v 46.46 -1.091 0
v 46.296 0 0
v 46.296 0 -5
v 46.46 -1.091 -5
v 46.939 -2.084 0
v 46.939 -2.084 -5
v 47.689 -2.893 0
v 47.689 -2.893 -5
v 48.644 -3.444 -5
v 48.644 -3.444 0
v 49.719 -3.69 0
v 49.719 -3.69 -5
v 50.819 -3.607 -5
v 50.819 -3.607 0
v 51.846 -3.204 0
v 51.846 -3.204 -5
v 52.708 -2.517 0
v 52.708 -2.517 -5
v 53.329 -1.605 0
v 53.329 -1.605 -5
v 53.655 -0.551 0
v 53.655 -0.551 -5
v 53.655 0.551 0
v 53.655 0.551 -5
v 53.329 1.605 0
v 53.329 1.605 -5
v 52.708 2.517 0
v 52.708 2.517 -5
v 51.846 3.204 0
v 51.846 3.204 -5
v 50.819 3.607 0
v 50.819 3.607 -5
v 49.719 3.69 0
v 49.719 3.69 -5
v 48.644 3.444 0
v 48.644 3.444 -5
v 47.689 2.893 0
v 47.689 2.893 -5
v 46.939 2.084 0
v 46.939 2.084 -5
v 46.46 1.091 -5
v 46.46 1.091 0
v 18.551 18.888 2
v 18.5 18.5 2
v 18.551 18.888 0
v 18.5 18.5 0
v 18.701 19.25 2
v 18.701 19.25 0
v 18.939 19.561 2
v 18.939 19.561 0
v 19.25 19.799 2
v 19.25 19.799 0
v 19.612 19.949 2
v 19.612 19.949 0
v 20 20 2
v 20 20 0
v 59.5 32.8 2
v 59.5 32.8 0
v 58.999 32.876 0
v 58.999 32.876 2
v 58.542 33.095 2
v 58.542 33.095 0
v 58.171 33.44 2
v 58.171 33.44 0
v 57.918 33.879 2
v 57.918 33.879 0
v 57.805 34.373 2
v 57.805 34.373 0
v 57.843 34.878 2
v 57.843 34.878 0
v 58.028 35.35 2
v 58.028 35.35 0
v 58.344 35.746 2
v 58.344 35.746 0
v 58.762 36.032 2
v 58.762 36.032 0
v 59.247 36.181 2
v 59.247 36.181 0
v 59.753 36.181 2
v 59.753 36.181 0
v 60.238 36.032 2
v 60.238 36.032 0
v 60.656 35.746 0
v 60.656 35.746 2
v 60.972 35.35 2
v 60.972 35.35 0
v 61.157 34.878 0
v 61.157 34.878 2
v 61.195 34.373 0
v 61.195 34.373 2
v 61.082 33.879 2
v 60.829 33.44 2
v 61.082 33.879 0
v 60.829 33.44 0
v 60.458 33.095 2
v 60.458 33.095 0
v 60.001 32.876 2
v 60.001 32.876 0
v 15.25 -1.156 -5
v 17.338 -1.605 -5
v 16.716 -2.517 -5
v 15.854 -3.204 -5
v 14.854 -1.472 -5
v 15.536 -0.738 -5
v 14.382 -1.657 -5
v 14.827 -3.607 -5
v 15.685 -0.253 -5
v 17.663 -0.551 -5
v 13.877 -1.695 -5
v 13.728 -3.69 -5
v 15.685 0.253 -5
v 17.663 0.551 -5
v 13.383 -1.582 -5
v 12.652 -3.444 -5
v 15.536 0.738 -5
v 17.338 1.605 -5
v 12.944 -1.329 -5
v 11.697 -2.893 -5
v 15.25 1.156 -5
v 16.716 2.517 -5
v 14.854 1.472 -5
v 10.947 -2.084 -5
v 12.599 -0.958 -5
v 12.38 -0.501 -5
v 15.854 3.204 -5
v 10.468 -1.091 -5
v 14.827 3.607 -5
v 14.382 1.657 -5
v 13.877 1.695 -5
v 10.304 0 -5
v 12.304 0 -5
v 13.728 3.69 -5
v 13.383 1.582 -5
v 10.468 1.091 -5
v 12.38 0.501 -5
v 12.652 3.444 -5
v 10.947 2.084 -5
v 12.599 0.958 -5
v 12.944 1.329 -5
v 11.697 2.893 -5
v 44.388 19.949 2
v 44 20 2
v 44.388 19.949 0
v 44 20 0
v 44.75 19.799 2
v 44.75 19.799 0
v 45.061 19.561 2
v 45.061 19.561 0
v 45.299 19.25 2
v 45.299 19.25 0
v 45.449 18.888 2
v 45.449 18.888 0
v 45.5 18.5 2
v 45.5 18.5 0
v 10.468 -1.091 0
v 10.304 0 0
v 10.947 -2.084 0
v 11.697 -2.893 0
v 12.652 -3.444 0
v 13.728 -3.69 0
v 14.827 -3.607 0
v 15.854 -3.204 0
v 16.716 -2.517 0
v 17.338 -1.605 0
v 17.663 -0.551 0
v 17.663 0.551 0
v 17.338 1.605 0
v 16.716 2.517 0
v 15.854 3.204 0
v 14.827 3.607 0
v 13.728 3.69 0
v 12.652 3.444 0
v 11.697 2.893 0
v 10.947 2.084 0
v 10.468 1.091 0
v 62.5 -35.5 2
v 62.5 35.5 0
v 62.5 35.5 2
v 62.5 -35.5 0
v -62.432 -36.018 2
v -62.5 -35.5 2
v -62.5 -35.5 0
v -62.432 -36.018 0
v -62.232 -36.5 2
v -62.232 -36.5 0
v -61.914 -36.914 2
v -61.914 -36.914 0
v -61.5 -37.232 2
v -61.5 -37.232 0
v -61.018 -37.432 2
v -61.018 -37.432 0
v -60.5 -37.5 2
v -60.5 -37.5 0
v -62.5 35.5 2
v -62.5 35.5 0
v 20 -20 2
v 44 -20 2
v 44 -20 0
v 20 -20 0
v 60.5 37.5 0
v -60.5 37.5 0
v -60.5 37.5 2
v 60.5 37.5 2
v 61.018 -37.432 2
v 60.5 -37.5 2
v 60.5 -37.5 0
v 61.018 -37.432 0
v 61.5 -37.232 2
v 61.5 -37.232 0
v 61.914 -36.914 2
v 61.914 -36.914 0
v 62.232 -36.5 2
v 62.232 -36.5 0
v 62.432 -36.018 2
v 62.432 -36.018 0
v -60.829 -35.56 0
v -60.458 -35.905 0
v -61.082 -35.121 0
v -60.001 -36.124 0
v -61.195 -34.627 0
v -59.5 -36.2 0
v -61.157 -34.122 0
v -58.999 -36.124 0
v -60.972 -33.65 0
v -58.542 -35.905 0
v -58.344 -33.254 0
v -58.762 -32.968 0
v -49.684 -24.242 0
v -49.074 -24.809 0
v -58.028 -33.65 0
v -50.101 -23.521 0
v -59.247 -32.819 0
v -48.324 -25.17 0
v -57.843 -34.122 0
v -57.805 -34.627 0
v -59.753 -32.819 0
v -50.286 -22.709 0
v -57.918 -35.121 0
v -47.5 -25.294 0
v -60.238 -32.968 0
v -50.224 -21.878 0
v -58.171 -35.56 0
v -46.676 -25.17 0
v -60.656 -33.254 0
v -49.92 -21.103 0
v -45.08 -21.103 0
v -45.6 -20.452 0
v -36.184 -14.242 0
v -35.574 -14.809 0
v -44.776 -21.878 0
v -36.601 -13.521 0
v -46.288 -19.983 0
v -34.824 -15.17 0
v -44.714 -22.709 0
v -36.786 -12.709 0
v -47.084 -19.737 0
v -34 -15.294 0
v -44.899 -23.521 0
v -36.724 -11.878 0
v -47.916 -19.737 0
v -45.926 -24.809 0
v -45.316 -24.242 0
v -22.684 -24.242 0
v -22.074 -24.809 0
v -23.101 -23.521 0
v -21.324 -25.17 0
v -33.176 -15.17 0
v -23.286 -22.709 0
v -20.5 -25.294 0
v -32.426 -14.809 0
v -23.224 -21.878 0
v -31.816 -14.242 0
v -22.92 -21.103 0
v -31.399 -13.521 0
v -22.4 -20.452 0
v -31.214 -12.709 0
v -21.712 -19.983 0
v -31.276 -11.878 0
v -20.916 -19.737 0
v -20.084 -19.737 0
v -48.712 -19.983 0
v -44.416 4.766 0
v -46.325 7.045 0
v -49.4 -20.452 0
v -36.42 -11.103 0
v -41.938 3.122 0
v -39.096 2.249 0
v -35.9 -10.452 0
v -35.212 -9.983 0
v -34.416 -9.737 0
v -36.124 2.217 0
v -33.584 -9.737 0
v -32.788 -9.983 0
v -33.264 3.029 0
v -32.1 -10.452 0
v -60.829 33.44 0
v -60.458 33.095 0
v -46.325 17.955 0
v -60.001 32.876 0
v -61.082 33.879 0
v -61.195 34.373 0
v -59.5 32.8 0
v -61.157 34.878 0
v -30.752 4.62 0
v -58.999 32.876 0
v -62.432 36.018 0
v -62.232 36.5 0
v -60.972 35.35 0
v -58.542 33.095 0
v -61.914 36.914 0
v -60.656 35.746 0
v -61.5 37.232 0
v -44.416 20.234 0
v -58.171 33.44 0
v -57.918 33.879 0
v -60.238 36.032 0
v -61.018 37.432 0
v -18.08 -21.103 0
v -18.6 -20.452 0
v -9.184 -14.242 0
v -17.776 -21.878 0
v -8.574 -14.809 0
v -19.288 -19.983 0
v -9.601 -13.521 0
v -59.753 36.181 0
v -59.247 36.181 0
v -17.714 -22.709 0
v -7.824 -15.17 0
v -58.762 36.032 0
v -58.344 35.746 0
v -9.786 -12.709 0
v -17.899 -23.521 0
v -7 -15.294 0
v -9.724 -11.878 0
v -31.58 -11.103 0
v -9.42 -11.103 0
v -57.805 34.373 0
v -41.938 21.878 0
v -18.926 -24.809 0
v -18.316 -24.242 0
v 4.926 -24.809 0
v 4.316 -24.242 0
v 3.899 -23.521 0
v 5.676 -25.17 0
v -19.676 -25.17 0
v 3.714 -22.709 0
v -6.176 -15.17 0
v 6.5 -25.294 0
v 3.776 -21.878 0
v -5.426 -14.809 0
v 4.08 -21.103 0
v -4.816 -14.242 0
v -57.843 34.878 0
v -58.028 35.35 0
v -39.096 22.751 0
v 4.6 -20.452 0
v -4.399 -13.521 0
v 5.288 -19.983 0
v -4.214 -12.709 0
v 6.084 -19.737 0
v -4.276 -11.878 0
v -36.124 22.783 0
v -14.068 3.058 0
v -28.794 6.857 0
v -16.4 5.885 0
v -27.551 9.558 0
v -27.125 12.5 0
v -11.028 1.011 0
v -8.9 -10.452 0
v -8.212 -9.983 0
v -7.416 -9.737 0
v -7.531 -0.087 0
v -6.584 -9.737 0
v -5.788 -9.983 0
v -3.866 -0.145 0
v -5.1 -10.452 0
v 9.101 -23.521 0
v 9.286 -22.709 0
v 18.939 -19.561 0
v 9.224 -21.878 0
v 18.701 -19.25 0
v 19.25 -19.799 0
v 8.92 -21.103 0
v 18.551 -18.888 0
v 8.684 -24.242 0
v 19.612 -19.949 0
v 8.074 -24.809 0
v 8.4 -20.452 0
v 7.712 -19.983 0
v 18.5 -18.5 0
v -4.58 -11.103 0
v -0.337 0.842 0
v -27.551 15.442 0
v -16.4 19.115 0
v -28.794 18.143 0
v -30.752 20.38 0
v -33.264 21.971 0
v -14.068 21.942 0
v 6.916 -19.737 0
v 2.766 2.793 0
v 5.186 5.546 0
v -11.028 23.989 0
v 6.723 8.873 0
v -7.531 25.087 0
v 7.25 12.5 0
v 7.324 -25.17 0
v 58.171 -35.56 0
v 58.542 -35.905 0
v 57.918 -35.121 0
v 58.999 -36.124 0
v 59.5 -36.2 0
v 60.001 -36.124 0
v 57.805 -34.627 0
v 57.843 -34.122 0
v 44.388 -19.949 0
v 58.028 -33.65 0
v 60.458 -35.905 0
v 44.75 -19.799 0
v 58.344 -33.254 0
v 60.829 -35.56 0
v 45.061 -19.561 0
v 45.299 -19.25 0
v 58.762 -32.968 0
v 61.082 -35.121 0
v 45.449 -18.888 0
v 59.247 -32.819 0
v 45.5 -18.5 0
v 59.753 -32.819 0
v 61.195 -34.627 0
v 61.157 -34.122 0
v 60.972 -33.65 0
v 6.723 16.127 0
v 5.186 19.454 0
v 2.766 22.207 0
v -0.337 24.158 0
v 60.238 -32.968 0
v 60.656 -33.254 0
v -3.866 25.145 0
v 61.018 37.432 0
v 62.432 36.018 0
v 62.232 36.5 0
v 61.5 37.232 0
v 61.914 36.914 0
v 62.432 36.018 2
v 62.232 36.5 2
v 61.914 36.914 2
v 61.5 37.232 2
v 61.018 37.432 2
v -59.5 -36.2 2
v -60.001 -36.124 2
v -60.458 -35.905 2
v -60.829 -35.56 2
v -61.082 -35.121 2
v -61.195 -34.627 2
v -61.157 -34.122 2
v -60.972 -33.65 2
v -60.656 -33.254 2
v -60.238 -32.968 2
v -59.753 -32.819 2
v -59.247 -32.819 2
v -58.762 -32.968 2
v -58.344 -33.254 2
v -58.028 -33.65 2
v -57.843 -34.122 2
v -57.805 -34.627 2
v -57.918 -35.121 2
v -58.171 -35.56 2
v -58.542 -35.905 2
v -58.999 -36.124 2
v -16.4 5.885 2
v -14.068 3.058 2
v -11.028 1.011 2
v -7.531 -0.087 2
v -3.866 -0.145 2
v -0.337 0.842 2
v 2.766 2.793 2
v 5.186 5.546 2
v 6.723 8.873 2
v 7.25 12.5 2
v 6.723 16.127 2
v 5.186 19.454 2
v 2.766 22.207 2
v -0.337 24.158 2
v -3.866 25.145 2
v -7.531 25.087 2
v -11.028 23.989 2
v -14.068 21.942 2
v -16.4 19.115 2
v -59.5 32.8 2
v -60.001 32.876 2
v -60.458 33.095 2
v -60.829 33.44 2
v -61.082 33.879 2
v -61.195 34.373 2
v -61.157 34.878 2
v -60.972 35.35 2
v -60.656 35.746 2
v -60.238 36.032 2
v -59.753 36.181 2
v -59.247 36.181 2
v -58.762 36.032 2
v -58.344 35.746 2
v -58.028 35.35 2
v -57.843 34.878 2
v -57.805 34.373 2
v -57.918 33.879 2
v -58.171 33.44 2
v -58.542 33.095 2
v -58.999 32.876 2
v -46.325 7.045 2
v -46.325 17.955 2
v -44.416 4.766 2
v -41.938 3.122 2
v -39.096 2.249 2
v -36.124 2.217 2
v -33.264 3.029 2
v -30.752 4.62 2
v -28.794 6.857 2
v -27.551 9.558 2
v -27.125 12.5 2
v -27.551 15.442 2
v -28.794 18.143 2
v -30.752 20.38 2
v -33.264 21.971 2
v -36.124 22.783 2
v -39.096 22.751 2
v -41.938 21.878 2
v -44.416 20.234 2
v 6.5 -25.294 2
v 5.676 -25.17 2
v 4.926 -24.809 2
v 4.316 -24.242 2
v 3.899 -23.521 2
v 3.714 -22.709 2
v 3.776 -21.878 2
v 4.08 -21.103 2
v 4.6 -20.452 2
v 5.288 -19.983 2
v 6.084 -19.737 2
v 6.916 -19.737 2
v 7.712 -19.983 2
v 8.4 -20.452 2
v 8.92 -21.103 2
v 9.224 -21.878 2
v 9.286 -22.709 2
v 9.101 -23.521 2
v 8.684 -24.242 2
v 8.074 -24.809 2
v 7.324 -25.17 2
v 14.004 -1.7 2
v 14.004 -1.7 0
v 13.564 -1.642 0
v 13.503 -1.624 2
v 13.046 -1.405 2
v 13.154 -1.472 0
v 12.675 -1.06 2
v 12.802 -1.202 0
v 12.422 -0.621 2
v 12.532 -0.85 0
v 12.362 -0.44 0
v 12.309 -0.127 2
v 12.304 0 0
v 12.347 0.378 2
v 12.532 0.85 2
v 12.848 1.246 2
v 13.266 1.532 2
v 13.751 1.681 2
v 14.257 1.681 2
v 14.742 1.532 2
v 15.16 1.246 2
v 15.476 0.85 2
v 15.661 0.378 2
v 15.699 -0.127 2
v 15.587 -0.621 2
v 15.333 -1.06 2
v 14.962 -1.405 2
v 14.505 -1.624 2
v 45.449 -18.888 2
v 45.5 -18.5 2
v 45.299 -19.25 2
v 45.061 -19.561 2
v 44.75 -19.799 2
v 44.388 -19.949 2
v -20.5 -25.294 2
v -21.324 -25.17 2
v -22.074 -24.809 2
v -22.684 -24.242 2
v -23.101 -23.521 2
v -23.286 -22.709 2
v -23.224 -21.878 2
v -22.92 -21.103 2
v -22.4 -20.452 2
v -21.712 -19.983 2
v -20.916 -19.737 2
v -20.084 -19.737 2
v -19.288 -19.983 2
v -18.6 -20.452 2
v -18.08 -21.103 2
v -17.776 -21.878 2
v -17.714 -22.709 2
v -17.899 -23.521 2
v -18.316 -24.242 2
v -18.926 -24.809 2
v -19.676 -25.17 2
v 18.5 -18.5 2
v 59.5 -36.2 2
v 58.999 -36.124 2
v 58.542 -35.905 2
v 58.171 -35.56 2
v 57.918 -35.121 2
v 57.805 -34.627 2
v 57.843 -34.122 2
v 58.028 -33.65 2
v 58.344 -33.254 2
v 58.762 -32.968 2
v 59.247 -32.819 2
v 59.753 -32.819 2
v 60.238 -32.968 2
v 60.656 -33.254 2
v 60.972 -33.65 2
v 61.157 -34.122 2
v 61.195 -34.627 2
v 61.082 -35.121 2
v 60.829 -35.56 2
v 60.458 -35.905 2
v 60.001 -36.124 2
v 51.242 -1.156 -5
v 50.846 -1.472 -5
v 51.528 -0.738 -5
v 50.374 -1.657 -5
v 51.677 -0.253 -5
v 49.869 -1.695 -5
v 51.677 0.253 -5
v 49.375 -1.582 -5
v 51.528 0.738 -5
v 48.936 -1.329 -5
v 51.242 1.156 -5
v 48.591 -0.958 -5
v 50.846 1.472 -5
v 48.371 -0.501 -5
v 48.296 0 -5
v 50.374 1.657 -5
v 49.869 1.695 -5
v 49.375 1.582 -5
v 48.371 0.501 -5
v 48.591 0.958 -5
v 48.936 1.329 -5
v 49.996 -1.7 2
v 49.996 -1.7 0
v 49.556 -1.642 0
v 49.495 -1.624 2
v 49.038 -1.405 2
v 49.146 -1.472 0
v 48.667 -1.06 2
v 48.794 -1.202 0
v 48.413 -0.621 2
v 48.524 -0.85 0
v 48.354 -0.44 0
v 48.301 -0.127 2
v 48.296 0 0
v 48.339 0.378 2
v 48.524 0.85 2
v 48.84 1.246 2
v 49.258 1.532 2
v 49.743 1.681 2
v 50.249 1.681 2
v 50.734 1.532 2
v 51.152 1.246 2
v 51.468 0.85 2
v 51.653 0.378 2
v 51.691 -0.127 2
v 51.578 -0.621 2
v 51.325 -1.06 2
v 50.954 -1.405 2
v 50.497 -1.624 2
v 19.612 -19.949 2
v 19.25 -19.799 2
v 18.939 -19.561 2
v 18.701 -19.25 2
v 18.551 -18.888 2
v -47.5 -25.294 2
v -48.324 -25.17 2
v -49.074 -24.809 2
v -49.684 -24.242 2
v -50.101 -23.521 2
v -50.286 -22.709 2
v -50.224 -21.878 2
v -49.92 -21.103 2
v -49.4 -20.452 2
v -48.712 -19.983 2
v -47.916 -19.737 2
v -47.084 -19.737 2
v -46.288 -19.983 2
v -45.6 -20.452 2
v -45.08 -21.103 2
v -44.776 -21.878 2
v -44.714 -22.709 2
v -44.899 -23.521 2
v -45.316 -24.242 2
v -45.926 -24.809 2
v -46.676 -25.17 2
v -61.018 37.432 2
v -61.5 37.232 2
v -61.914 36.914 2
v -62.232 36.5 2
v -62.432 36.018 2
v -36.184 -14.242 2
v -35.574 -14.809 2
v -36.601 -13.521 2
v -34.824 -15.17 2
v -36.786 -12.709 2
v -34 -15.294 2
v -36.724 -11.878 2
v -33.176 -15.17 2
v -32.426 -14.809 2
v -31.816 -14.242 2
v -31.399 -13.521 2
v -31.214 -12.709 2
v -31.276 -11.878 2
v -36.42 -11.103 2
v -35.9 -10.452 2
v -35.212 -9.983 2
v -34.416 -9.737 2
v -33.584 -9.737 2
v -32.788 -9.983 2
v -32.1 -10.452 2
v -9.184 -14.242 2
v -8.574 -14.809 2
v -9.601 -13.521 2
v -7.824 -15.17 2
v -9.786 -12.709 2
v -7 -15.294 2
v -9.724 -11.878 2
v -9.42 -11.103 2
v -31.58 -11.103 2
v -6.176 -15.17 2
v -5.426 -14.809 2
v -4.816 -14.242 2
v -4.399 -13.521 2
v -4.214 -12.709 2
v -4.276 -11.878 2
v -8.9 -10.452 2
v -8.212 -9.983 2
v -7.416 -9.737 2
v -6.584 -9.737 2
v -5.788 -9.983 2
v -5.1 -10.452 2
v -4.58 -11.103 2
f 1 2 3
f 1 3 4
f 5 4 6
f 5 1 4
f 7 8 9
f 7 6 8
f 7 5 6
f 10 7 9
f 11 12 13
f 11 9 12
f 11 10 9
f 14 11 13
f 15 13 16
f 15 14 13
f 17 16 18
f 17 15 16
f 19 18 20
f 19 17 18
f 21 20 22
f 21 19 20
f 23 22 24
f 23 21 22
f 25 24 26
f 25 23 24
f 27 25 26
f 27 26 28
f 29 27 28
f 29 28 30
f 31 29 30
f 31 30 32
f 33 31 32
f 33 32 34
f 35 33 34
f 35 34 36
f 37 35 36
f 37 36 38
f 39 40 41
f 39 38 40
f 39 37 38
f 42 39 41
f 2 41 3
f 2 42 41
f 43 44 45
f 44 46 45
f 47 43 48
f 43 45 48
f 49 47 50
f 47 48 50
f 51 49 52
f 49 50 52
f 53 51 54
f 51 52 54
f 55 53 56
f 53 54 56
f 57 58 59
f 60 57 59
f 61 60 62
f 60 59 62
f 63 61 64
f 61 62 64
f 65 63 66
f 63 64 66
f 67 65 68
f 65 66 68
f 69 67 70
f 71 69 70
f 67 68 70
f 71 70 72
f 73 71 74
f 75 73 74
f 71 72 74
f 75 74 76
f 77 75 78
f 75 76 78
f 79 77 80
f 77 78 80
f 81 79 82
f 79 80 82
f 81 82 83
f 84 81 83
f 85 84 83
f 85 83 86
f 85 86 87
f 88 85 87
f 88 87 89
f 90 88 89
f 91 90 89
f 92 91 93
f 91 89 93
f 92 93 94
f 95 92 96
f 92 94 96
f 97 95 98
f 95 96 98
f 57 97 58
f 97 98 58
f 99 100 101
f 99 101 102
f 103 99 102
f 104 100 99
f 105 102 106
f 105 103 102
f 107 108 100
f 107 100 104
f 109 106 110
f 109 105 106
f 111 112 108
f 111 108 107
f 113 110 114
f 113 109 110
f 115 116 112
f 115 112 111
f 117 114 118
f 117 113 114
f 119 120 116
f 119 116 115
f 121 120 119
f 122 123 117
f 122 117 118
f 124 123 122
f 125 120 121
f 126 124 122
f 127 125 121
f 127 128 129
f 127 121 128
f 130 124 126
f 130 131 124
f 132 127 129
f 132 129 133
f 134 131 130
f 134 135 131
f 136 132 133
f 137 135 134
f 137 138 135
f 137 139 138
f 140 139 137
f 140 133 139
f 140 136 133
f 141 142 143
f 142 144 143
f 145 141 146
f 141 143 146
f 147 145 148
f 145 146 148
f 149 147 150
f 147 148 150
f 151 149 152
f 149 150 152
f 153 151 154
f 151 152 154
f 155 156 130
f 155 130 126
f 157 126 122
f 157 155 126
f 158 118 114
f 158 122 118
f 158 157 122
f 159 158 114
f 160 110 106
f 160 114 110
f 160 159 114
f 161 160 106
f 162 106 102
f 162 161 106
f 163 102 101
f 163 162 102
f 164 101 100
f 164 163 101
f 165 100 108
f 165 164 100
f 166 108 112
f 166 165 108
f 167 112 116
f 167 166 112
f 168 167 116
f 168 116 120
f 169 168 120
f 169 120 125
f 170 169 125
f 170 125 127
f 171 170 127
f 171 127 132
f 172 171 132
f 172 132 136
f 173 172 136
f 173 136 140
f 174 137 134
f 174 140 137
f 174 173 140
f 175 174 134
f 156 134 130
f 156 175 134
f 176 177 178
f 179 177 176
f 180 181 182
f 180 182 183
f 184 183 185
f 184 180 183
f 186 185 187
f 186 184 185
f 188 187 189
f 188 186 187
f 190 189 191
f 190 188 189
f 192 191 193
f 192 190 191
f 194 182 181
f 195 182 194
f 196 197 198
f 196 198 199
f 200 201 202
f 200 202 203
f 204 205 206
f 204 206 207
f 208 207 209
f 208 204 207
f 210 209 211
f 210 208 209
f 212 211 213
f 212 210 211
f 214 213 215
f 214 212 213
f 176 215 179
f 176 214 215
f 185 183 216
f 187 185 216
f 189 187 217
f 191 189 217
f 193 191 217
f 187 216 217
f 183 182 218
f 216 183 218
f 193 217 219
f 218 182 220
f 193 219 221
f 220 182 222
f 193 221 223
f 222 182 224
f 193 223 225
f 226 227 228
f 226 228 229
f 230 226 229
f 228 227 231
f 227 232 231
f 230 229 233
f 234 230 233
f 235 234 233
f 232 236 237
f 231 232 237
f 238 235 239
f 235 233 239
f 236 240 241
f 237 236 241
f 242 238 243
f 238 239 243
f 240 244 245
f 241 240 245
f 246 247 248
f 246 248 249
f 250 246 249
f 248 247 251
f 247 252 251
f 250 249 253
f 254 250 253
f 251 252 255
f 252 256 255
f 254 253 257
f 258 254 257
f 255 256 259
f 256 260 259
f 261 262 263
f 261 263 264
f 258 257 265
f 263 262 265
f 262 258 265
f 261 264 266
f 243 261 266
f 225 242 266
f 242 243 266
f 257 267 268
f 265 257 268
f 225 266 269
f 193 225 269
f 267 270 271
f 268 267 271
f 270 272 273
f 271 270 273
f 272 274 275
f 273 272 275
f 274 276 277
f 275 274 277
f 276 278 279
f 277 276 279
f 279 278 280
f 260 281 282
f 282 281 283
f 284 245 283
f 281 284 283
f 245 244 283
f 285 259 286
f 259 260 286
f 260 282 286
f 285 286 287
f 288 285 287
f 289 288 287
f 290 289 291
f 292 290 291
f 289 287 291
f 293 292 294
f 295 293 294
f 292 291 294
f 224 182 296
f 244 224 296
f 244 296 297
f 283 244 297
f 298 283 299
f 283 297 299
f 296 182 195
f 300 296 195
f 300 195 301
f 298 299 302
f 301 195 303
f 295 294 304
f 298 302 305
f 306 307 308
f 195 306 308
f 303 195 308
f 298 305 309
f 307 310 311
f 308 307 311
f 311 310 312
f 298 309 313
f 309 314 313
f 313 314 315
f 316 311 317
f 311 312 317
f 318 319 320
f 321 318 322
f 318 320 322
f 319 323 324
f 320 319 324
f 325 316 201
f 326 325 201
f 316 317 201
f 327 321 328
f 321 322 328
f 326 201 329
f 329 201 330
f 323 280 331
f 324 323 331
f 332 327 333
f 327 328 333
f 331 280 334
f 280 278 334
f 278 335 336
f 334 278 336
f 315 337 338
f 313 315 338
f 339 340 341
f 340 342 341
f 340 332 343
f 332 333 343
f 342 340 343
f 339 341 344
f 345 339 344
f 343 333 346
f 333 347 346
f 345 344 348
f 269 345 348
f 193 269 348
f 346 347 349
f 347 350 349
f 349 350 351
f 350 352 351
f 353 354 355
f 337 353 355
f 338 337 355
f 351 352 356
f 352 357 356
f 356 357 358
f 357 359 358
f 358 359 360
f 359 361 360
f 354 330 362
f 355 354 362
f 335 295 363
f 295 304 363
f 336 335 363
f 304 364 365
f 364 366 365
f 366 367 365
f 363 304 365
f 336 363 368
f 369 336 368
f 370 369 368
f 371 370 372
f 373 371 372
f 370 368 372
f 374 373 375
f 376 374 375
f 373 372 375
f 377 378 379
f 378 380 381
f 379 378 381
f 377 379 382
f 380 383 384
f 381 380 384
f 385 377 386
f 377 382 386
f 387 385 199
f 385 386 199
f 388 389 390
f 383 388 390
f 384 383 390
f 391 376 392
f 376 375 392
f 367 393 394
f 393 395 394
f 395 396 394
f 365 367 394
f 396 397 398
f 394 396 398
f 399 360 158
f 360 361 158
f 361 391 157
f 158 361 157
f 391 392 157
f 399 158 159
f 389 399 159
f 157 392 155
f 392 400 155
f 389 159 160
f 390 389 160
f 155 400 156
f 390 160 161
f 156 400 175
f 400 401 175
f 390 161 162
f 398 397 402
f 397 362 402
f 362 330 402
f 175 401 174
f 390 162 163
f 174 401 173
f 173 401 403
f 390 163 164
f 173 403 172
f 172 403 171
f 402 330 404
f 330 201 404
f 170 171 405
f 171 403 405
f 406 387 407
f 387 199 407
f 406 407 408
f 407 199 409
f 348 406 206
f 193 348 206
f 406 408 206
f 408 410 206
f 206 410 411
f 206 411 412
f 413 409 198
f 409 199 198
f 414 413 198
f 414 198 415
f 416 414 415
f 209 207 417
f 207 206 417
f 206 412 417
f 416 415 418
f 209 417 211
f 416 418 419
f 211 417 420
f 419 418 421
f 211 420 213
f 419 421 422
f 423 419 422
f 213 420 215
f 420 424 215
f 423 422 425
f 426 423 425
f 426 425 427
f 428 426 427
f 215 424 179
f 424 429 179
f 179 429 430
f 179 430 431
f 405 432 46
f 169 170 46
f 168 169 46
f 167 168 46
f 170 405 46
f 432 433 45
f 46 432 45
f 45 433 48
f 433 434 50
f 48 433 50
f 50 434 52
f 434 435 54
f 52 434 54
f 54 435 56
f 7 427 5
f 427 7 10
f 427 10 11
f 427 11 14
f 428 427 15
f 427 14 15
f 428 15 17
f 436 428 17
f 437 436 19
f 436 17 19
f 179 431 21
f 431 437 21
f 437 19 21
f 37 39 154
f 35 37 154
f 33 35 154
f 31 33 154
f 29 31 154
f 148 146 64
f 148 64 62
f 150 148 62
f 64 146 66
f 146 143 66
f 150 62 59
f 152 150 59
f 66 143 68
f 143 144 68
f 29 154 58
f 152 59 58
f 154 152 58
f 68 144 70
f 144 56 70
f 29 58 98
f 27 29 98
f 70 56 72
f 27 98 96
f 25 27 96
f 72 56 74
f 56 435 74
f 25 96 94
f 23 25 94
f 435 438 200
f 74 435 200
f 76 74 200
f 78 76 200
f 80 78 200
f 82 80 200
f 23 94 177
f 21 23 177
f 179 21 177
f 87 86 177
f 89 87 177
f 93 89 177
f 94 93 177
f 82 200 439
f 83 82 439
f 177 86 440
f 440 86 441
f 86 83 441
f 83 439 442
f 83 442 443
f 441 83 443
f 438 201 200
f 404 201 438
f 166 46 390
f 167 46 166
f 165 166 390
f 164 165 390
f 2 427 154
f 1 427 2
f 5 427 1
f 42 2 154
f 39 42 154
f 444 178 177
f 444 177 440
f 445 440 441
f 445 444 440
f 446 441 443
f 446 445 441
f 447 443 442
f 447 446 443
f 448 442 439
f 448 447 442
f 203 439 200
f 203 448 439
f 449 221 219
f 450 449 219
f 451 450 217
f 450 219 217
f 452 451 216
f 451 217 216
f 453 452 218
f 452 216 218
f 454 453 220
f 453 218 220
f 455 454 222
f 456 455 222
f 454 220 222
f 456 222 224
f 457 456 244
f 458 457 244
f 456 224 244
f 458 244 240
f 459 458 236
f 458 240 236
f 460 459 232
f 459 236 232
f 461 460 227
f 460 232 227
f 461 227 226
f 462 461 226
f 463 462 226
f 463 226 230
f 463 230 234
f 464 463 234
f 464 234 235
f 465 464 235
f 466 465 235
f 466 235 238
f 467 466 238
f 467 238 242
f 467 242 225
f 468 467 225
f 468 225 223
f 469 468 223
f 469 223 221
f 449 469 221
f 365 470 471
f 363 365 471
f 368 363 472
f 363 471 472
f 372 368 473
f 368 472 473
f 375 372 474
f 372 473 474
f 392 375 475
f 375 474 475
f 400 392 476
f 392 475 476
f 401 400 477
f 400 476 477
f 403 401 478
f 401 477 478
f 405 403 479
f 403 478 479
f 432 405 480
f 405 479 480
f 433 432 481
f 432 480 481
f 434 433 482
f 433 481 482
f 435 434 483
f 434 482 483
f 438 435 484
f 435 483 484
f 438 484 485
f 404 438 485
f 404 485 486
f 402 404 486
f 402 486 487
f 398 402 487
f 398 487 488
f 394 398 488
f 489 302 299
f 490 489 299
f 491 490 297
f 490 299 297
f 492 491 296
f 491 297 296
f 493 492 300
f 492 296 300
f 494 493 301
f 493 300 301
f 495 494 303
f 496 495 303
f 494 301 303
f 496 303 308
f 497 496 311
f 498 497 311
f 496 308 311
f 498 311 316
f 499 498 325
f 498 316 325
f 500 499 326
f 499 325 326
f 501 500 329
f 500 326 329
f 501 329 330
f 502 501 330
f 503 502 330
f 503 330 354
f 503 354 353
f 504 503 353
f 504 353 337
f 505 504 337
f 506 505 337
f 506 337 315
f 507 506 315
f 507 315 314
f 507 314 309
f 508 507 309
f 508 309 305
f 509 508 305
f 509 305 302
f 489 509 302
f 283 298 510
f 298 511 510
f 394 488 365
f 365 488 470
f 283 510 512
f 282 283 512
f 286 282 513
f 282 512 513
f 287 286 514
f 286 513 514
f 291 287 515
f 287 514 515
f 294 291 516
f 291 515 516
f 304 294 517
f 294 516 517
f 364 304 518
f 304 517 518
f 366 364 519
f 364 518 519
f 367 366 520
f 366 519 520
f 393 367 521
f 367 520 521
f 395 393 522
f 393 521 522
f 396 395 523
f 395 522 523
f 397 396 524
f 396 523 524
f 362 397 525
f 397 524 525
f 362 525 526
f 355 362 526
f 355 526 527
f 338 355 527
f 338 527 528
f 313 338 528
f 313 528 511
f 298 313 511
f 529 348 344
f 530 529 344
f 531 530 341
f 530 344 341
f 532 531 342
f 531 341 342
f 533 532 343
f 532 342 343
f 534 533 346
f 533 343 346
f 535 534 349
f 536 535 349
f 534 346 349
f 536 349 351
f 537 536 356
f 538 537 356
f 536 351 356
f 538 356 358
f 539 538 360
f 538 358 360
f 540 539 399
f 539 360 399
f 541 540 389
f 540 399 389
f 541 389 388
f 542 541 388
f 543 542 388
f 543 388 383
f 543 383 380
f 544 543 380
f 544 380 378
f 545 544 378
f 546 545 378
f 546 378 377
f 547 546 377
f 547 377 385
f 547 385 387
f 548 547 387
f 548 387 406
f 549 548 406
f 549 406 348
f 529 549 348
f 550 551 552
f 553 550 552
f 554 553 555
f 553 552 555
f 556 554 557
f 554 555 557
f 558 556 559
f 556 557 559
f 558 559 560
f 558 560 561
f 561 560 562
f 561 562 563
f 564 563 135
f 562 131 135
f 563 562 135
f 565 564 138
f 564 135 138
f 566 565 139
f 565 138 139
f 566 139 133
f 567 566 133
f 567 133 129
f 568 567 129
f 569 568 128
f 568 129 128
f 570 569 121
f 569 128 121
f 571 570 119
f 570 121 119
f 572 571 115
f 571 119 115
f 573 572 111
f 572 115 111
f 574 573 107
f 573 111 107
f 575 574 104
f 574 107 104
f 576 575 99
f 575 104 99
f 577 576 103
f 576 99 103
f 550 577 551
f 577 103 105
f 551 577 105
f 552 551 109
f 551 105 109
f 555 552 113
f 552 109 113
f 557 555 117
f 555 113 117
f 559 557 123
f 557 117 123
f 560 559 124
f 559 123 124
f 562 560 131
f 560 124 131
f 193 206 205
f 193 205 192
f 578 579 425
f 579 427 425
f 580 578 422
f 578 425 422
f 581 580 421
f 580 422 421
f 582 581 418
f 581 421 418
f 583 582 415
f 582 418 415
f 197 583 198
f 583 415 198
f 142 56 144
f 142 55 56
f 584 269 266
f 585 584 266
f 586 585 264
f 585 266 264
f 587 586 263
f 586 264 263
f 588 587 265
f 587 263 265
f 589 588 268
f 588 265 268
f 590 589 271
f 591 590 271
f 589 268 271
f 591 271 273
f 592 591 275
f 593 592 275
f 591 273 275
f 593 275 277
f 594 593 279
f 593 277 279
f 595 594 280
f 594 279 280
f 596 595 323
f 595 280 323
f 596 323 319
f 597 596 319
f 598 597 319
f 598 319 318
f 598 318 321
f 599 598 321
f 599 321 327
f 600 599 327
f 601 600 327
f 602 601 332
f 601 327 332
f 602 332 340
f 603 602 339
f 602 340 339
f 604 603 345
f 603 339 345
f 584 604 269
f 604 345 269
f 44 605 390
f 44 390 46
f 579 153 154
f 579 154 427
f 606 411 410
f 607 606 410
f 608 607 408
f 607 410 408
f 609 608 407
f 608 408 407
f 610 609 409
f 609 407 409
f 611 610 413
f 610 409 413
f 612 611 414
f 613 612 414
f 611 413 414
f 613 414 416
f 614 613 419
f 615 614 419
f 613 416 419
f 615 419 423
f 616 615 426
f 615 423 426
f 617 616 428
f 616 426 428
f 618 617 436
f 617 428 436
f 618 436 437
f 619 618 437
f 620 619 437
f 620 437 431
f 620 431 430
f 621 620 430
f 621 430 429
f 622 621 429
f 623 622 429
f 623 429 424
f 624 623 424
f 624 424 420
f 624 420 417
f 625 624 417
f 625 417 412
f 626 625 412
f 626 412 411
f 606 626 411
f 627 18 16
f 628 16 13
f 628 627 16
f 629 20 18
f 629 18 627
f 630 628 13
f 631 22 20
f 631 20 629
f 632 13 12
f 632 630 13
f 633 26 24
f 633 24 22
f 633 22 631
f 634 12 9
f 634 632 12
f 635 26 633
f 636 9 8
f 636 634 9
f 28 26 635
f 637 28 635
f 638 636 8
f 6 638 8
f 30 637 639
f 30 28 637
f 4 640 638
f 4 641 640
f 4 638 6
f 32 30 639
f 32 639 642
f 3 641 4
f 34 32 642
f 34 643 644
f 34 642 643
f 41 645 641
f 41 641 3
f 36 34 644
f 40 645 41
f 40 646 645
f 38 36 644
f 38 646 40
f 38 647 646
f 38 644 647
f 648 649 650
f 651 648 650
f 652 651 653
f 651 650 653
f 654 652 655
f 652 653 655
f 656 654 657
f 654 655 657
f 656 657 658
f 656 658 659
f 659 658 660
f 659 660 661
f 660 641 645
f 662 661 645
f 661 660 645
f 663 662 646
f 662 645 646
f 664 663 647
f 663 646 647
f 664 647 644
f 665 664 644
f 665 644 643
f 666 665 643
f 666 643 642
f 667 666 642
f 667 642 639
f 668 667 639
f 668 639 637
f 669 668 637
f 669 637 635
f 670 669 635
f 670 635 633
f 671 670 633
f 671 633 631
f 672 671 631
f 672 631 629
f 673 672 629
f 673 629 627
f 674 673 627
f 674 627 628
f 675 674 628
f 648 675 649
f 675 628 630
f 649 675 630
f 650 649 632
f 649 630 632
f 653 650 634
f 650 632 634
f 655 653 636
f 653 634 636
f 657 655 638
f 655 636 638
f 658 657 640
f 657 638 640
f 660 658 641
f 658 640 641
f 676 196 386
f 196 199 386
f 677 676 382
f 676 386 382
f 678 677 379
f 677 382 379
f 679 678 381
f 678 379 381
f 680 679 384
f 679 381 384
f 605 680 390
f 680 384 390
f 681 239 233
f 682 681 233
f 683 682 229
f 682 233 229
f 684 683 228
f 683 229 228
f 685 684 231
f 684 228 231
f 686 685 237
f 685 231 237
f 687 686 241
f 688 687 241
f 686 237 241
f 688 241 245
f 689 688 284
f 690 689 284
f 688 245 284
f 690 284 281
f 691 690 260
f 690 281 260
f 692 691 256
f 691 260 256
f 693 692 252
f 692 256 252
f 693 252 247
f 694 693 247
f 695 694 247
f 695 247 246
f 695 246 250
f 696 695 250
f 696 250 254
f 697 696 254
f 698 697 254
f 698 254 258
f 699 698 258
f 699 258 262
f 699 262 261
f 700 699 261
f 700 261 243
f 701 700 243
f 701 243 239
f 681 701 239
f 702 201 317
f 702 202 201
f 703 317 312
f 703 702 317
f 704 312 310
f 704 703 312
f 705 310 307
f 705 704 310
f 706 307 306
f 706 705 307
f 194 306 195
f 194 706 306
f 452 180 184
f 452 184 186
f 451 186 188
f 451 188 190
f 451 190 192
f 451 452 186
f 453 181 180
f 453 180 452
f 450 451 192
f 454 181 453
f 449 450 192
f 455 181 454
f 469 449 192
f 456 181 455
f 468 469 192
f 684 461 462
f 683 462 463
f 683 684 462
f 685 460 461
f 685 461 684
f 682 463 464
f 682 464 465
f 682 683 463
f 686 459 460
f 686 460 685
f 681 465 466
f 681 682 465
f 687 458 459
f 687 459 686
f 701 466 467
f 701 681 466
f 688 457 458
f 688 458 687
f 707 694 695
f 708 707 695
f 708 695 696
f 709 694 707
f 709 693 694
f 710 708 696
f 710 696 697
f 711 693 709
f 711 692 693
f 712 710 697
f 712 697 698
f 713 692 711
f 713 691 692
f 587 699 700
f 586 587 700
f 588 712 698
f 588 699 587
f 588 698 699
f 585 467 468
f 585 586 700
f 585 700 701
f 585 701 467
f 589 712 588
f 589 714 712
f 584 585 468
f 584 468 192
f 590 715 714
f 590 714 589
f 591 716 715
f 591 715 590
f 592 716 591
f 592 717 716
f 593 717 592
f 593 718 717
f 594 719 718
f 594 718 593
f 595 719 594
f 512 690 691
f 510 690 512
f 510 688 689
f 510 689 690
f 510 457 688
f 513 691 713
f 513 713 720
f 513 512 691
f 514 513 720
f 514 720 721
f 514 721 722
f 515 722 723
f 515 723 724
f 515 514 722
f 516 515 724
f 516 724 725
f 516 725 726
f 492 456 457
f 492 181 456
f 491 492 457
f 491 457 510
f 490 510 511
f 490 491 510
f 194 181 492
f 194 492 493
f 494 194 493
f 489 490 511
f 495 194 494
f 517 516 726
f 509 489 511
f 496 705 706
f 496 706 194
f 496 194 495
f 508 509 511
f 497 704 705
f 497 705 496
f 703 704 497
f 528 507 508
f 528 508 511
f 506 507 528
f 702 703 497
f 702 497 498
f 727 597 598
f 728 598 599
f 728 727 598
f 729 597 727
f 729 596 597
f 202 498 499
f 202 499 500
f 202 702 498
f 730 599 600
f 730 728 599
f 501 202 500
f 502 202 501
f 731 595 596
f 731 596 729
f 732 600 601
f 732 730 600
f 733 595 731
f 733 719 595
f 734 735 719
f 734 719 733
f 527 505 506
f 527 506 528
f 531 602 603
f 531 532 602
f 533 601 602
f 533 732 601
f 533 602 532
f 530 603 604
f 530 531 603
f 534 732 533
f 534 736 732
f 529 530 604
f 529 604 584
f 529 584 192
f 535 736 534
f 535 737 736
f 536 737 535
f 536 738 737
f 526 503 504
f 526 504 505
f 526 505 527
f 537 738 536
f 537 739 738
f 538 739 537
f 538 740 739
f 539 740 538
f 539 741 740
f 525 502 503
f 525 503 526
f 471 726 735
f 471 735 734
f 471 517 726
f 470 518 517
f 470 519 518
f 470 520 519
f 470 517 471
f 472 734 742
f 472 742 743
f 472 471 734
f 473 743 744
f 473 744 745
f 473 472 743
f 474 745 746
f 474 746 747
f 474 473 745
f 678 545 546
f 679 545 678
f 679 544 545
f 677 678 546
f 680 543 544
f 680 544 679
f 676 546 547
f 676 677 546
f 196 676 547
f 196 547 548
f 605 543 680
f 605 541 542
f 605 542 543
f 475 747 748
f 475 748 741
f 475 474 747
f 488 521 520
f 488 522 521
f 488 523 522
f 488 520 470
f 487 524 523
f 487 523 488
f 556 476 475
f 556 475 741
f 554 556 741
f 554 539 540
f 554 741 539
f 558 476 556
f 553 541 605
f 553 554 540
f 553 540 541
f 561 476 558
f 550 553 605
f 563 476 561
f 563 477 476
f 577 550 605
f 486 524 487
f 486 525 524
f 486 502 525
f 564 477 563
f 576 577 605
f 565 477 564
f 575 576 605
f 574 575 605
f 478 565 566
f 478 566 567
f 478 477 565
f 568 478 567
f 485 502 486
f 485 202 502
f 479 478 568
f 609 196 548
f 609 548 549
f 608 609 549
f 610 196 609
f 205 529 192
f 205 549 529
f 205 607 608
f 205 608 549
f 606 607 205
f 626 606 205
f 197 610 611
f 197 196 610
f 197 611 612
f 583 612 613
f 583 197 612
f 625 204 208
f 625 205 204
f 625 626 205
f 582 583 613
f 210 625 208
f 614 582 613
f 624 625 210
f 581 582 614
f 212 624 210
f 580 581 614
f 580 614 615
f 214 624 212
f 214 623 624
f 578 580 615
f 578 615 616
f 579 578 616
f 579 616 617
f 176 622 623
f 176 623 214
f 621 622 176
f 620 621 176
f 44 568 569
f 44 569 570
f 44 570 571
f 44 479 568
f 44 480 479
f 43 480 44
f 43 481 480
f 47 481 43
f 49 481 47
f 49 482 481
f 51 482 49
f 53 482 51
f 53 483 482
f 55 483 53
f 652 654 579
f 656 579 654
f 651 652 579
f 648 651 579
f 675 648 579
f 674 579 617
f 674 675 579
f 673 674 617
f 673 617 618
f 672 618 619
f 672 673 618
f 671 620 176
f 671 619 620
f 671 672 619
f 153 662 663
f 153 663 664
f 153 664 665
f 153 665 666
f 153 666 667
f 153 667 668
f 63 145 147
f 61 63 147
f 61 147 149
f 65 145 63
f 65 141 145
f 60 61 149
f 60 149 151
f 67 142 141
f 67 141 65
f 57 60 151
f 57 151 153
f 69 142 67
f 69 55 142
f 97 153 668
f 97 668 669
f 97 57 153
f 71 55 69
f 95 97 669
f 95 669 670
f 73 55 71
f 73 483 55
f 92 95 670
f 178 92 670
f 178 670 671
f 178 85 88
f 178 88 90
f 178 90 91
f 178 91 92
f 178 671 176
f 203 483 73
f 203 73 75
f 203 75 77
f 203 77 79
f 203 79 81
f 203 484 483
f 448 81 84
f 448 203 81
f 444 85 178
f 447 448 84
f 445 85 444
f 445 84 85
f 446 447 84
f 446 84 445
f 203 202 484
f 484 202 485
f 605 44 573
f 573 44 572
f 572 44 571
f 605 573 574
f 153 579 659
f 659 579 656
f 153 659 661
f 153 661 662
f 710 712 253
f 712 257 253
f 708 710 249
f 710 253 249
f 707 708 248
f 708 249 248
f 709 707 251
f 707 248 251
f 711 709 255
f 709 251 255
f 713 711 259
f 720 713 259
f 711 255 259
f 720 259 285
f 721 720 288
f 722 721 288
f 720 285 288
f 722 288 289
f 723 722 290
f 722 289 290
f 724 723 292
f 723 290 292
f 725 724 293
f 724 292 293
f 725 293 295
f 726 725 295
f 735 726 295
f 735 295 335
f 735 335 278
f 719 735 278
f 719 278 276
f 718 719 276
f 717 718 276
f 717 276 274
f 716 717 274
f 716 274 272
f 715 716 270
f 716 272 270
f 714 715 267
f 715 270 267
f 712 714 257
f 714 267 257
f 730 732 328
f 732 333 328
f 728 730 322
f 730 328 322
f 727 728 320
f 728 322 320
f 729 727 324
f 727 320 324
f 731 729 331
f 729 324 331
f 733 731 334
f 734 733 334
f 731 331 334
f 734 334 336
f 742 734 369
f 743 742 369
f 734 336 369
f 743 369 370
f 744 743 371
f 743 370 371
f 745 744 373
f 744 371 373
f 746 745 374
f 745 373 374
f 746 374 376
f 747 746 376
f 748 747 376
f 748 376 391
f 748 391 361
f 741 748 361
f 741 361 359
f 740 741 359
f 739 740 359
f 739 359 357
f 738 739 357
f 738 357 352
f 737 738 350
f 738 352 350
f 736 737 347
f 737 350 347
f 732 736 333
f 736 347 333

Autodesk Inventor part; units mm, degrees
ref_plane "YZ Plane" through (0, 0, 0) normal (1, 0, 0) x (0, 1, 0)
ref_plane "XZ Plane" through (0, 0, 0) normal (0, 1, 0) x (-1, 0, 0)
ref_plane "XY Plane" through (0, 0, 0) normal (0, 0, 1) x (1, 0, 0)
sketch "Sketch1" plane through (0, 0, 0) normal (0, 0, 1) x (1, 0, 0)
  line L0 (-62.5, 37.5) -> (62.5, 37.5)
  line L1 (62.5, 37.5) -> (62.5, -37.5)
  line L2 (62.5, -37.5) -> (-62.5, -37.5)
  line L3 (-62.5, -37.5) -> (-62.5, 37.5)
  point P0 (0, 0)
  point P1 (-62.5, 0)
  point P2 (0, 37.5)
  dimension "d0" = 125
  dimension "d1" = 75
extrude "Extrusion1" add sketch "Sketch1" along normal blind 2
sketch "Sketch2" plane through (0, 0, 2) normal (0, 0, 1) x (1, 0, 0)
  line L0 (-62.5, -37.5) -> (62.5, -37.5) projected
  line L1 (62.5, -37.5) -> (62.5, 37.5) projected
  line L2 (62.5, 37.5) -> (-62.5, 37.5) projected
  line L3 (-62.5, 37.5) -> (-62.5, -37.5) projected
  line L4 (-59.5, 34.5) -> (59.5, 34.5)
  line L5 (59.5, 34.5) -> (59.5, -34.5)
  line L6 (59.5, -34.5) -> (-59.5, -34.5)
  line L7 (-59.5, -34.5) -> (-59.5, 34.5)
  point P0 (0, 0)
  dimension "d4" = 3
hole "Hole1" at (-59.5, 34.5, 2) at (59.5, 34.5, 2) at (-59.5, -34.5, 2) at (59.5, -34.5, 2) direction (0, 0, -1) diameter 3.4 end through all clearance for "Oval Head Machine Screw" size "M3" standard "Ansi Metric M Profile"
fillet "Fillet1" radius 2 4 edges at (-62.5, 37.5, 1) (-62.5, -37.5, 1) (62.5, -37.5, 1) (62.5, 37.5, 1)
sketch "Sketch3" plane through (0, 0, 2) normal (0, 0, 1) x (1, 0, 0)
  line L0 (18.5, 20) -> (45.5, 20)
  line L1 (45.5, 20) -> (45.5, -20)
  line L2 (45.5, -20) -> (18.5, -20)
  line L3 (18.5, -20) -> (18.5, 20)
  line L4 (62.5, -35.5) -> (62.5, 35.5) projected
  point P0 (0, 0)
  point P1 (18.5, 0)
  dimension "d13" = 27
  dimension "d14" = 40
  dimension "d16" = 17
extrude "Extrusion2" cut sketch "Sketch3" against normal through all
fillet "Fillet2" radius 1.5 4 edges at (18.5, -20, 1) (18.5, 20, 1) (45.5, 20, 1) (45.5, -20, 1)
sketch "Sketch4" plane through (0, 0, 2) normal (0, 0, 1) x (1, 0, 0)
  line L0 (44, 20) -> (20, 20) projected
  line L1 (44, -20) -> (20, -20) projected
  line L2 (18.5, -18.5) -> (18.5, 18.5) projected
  line L3 (20, 20) -> (44, 20) projected
  line L4 (45.5, 18.5) -> (45.5, -18.5) projected
  line L5 (14.0041, -17.1435) -> (14.0041, 17.1435)
  line L6 (49.9959, 17.1435) -> (49.9959, -17.1435)
  line L7 (32, 20) -> (32, -20)
  point P0 (0, 0)
  point P1 (14.0041, 0)
  point P2 (49.9959, 0)
  dimension "d21" = 35.9918
hole "Hole2" at (14.0041, 0, 2) at (49.9959, 0, 2) direction (0, 0, -1) diameter 3.4 depth 6 tip angle 118 clearance for "Oval Head Machine Screw" size "M3" standard "Ansi Metric M Profile"
sketch "Sketch5" plane through (0, 0, 2) normal (0, 0, 1) x (1, 0, 0)
  circle A0 centre (-37.5, 12.5) radius 10.375
  line L0 (-46.325, 17.9553) -> (-46.325, 7.0447)
  line L1 (-62.5, 35.5) -> (-62.5, -35.5) projected
  line L2 (60.5, 37.5) -> (-60.5, 37.5) projected
  point P0 (0, 0)
  dimension "d29" = 20.75
  dimension "d30" = 8.825
  dimension "d31" = 25
  dimension "d32" = 25
extrude "Extrusion3" cut sketch "Sketch5" against normal blind 10 contours A0 L0 picked at (-32.9905, 14.9651)
sketch "Sketch6" plane through (0, 0, 2) normal (0, 0, 1) x (1, 0, 0)
  circle A0 centre (-5.5, 12.5) radius 12.75
  line L0 (-16.4, 19.1146) -> (-16.4, 5.8854)
  arc A1 (-46.325, 7.0447) -> (-46.325, 17.9553) centre (-37.5, 12.5) ccw projected
  point P0 (0, 0)
  dimension "d35" = 25.5
  dimension "d36" = 10.9
  dimension "d37" = 32
extrude "Extrusion4" cut sketch "Sketch6" against normal blind 10 contours A0 L0 picked at (-6.5005, 11.8775)
sketch "Sketch7" plane through (0, 0, 2) normal (0, 0, 1) x (1, 0, 0)
  line L0 (-47.5, -22.5) -> (6.5, -22.5)
  line L1 (-62.5, 35.5) -> (-62.5, -35.5) projected
  line L2 (-60.5, -37.5) -> (60.5, -37.5) projected
  line L3 (-34, -12.5) -> (-7, -12.5)
  point P0 (0, 0)
  point P1 (-20.5, -22.5)
  point P2 (-20.5, -12.5)
  dimension "d40" = 54
  dimension "d43" = 15
  dimension "d56" = 15
  dimension "d57" = 10
  dimension "d58" = 27
hole "Hole3" at (-47.5, -22.5, 2) at (6.5, -22.5, 2) at (-20.5, -22.5, 2) at (-34, -12.5, 2) at (-7, -12.5, 2) direction (0, 0, -1) diameter 5.588 end through all thread size "1/4-36 UNS" class "2B" standard "ANSI Unified Screw Threads"
sketch "Sketch8" plane through (0, 0, 0) normal (0, 0, -1) x (-1, 0, 0)
  circle A0 centre (-49.9959, 0) radius 1.7 projected
  circle A1 centre (-14.0041, 0) radius 1.7 projected
  circle A2 centre (-49.9959, 0) radius 3.7
  circle A3 centre (-14.0041, 0) radius 3.7
  point P0 (0, 0)
  dimension "d52" = 2
  dimension "d53" = 2
extrude "Extrusion5" add sketch "Sketch8" along normal blind 5
properties part number "LI0011-IO SHIELD"
